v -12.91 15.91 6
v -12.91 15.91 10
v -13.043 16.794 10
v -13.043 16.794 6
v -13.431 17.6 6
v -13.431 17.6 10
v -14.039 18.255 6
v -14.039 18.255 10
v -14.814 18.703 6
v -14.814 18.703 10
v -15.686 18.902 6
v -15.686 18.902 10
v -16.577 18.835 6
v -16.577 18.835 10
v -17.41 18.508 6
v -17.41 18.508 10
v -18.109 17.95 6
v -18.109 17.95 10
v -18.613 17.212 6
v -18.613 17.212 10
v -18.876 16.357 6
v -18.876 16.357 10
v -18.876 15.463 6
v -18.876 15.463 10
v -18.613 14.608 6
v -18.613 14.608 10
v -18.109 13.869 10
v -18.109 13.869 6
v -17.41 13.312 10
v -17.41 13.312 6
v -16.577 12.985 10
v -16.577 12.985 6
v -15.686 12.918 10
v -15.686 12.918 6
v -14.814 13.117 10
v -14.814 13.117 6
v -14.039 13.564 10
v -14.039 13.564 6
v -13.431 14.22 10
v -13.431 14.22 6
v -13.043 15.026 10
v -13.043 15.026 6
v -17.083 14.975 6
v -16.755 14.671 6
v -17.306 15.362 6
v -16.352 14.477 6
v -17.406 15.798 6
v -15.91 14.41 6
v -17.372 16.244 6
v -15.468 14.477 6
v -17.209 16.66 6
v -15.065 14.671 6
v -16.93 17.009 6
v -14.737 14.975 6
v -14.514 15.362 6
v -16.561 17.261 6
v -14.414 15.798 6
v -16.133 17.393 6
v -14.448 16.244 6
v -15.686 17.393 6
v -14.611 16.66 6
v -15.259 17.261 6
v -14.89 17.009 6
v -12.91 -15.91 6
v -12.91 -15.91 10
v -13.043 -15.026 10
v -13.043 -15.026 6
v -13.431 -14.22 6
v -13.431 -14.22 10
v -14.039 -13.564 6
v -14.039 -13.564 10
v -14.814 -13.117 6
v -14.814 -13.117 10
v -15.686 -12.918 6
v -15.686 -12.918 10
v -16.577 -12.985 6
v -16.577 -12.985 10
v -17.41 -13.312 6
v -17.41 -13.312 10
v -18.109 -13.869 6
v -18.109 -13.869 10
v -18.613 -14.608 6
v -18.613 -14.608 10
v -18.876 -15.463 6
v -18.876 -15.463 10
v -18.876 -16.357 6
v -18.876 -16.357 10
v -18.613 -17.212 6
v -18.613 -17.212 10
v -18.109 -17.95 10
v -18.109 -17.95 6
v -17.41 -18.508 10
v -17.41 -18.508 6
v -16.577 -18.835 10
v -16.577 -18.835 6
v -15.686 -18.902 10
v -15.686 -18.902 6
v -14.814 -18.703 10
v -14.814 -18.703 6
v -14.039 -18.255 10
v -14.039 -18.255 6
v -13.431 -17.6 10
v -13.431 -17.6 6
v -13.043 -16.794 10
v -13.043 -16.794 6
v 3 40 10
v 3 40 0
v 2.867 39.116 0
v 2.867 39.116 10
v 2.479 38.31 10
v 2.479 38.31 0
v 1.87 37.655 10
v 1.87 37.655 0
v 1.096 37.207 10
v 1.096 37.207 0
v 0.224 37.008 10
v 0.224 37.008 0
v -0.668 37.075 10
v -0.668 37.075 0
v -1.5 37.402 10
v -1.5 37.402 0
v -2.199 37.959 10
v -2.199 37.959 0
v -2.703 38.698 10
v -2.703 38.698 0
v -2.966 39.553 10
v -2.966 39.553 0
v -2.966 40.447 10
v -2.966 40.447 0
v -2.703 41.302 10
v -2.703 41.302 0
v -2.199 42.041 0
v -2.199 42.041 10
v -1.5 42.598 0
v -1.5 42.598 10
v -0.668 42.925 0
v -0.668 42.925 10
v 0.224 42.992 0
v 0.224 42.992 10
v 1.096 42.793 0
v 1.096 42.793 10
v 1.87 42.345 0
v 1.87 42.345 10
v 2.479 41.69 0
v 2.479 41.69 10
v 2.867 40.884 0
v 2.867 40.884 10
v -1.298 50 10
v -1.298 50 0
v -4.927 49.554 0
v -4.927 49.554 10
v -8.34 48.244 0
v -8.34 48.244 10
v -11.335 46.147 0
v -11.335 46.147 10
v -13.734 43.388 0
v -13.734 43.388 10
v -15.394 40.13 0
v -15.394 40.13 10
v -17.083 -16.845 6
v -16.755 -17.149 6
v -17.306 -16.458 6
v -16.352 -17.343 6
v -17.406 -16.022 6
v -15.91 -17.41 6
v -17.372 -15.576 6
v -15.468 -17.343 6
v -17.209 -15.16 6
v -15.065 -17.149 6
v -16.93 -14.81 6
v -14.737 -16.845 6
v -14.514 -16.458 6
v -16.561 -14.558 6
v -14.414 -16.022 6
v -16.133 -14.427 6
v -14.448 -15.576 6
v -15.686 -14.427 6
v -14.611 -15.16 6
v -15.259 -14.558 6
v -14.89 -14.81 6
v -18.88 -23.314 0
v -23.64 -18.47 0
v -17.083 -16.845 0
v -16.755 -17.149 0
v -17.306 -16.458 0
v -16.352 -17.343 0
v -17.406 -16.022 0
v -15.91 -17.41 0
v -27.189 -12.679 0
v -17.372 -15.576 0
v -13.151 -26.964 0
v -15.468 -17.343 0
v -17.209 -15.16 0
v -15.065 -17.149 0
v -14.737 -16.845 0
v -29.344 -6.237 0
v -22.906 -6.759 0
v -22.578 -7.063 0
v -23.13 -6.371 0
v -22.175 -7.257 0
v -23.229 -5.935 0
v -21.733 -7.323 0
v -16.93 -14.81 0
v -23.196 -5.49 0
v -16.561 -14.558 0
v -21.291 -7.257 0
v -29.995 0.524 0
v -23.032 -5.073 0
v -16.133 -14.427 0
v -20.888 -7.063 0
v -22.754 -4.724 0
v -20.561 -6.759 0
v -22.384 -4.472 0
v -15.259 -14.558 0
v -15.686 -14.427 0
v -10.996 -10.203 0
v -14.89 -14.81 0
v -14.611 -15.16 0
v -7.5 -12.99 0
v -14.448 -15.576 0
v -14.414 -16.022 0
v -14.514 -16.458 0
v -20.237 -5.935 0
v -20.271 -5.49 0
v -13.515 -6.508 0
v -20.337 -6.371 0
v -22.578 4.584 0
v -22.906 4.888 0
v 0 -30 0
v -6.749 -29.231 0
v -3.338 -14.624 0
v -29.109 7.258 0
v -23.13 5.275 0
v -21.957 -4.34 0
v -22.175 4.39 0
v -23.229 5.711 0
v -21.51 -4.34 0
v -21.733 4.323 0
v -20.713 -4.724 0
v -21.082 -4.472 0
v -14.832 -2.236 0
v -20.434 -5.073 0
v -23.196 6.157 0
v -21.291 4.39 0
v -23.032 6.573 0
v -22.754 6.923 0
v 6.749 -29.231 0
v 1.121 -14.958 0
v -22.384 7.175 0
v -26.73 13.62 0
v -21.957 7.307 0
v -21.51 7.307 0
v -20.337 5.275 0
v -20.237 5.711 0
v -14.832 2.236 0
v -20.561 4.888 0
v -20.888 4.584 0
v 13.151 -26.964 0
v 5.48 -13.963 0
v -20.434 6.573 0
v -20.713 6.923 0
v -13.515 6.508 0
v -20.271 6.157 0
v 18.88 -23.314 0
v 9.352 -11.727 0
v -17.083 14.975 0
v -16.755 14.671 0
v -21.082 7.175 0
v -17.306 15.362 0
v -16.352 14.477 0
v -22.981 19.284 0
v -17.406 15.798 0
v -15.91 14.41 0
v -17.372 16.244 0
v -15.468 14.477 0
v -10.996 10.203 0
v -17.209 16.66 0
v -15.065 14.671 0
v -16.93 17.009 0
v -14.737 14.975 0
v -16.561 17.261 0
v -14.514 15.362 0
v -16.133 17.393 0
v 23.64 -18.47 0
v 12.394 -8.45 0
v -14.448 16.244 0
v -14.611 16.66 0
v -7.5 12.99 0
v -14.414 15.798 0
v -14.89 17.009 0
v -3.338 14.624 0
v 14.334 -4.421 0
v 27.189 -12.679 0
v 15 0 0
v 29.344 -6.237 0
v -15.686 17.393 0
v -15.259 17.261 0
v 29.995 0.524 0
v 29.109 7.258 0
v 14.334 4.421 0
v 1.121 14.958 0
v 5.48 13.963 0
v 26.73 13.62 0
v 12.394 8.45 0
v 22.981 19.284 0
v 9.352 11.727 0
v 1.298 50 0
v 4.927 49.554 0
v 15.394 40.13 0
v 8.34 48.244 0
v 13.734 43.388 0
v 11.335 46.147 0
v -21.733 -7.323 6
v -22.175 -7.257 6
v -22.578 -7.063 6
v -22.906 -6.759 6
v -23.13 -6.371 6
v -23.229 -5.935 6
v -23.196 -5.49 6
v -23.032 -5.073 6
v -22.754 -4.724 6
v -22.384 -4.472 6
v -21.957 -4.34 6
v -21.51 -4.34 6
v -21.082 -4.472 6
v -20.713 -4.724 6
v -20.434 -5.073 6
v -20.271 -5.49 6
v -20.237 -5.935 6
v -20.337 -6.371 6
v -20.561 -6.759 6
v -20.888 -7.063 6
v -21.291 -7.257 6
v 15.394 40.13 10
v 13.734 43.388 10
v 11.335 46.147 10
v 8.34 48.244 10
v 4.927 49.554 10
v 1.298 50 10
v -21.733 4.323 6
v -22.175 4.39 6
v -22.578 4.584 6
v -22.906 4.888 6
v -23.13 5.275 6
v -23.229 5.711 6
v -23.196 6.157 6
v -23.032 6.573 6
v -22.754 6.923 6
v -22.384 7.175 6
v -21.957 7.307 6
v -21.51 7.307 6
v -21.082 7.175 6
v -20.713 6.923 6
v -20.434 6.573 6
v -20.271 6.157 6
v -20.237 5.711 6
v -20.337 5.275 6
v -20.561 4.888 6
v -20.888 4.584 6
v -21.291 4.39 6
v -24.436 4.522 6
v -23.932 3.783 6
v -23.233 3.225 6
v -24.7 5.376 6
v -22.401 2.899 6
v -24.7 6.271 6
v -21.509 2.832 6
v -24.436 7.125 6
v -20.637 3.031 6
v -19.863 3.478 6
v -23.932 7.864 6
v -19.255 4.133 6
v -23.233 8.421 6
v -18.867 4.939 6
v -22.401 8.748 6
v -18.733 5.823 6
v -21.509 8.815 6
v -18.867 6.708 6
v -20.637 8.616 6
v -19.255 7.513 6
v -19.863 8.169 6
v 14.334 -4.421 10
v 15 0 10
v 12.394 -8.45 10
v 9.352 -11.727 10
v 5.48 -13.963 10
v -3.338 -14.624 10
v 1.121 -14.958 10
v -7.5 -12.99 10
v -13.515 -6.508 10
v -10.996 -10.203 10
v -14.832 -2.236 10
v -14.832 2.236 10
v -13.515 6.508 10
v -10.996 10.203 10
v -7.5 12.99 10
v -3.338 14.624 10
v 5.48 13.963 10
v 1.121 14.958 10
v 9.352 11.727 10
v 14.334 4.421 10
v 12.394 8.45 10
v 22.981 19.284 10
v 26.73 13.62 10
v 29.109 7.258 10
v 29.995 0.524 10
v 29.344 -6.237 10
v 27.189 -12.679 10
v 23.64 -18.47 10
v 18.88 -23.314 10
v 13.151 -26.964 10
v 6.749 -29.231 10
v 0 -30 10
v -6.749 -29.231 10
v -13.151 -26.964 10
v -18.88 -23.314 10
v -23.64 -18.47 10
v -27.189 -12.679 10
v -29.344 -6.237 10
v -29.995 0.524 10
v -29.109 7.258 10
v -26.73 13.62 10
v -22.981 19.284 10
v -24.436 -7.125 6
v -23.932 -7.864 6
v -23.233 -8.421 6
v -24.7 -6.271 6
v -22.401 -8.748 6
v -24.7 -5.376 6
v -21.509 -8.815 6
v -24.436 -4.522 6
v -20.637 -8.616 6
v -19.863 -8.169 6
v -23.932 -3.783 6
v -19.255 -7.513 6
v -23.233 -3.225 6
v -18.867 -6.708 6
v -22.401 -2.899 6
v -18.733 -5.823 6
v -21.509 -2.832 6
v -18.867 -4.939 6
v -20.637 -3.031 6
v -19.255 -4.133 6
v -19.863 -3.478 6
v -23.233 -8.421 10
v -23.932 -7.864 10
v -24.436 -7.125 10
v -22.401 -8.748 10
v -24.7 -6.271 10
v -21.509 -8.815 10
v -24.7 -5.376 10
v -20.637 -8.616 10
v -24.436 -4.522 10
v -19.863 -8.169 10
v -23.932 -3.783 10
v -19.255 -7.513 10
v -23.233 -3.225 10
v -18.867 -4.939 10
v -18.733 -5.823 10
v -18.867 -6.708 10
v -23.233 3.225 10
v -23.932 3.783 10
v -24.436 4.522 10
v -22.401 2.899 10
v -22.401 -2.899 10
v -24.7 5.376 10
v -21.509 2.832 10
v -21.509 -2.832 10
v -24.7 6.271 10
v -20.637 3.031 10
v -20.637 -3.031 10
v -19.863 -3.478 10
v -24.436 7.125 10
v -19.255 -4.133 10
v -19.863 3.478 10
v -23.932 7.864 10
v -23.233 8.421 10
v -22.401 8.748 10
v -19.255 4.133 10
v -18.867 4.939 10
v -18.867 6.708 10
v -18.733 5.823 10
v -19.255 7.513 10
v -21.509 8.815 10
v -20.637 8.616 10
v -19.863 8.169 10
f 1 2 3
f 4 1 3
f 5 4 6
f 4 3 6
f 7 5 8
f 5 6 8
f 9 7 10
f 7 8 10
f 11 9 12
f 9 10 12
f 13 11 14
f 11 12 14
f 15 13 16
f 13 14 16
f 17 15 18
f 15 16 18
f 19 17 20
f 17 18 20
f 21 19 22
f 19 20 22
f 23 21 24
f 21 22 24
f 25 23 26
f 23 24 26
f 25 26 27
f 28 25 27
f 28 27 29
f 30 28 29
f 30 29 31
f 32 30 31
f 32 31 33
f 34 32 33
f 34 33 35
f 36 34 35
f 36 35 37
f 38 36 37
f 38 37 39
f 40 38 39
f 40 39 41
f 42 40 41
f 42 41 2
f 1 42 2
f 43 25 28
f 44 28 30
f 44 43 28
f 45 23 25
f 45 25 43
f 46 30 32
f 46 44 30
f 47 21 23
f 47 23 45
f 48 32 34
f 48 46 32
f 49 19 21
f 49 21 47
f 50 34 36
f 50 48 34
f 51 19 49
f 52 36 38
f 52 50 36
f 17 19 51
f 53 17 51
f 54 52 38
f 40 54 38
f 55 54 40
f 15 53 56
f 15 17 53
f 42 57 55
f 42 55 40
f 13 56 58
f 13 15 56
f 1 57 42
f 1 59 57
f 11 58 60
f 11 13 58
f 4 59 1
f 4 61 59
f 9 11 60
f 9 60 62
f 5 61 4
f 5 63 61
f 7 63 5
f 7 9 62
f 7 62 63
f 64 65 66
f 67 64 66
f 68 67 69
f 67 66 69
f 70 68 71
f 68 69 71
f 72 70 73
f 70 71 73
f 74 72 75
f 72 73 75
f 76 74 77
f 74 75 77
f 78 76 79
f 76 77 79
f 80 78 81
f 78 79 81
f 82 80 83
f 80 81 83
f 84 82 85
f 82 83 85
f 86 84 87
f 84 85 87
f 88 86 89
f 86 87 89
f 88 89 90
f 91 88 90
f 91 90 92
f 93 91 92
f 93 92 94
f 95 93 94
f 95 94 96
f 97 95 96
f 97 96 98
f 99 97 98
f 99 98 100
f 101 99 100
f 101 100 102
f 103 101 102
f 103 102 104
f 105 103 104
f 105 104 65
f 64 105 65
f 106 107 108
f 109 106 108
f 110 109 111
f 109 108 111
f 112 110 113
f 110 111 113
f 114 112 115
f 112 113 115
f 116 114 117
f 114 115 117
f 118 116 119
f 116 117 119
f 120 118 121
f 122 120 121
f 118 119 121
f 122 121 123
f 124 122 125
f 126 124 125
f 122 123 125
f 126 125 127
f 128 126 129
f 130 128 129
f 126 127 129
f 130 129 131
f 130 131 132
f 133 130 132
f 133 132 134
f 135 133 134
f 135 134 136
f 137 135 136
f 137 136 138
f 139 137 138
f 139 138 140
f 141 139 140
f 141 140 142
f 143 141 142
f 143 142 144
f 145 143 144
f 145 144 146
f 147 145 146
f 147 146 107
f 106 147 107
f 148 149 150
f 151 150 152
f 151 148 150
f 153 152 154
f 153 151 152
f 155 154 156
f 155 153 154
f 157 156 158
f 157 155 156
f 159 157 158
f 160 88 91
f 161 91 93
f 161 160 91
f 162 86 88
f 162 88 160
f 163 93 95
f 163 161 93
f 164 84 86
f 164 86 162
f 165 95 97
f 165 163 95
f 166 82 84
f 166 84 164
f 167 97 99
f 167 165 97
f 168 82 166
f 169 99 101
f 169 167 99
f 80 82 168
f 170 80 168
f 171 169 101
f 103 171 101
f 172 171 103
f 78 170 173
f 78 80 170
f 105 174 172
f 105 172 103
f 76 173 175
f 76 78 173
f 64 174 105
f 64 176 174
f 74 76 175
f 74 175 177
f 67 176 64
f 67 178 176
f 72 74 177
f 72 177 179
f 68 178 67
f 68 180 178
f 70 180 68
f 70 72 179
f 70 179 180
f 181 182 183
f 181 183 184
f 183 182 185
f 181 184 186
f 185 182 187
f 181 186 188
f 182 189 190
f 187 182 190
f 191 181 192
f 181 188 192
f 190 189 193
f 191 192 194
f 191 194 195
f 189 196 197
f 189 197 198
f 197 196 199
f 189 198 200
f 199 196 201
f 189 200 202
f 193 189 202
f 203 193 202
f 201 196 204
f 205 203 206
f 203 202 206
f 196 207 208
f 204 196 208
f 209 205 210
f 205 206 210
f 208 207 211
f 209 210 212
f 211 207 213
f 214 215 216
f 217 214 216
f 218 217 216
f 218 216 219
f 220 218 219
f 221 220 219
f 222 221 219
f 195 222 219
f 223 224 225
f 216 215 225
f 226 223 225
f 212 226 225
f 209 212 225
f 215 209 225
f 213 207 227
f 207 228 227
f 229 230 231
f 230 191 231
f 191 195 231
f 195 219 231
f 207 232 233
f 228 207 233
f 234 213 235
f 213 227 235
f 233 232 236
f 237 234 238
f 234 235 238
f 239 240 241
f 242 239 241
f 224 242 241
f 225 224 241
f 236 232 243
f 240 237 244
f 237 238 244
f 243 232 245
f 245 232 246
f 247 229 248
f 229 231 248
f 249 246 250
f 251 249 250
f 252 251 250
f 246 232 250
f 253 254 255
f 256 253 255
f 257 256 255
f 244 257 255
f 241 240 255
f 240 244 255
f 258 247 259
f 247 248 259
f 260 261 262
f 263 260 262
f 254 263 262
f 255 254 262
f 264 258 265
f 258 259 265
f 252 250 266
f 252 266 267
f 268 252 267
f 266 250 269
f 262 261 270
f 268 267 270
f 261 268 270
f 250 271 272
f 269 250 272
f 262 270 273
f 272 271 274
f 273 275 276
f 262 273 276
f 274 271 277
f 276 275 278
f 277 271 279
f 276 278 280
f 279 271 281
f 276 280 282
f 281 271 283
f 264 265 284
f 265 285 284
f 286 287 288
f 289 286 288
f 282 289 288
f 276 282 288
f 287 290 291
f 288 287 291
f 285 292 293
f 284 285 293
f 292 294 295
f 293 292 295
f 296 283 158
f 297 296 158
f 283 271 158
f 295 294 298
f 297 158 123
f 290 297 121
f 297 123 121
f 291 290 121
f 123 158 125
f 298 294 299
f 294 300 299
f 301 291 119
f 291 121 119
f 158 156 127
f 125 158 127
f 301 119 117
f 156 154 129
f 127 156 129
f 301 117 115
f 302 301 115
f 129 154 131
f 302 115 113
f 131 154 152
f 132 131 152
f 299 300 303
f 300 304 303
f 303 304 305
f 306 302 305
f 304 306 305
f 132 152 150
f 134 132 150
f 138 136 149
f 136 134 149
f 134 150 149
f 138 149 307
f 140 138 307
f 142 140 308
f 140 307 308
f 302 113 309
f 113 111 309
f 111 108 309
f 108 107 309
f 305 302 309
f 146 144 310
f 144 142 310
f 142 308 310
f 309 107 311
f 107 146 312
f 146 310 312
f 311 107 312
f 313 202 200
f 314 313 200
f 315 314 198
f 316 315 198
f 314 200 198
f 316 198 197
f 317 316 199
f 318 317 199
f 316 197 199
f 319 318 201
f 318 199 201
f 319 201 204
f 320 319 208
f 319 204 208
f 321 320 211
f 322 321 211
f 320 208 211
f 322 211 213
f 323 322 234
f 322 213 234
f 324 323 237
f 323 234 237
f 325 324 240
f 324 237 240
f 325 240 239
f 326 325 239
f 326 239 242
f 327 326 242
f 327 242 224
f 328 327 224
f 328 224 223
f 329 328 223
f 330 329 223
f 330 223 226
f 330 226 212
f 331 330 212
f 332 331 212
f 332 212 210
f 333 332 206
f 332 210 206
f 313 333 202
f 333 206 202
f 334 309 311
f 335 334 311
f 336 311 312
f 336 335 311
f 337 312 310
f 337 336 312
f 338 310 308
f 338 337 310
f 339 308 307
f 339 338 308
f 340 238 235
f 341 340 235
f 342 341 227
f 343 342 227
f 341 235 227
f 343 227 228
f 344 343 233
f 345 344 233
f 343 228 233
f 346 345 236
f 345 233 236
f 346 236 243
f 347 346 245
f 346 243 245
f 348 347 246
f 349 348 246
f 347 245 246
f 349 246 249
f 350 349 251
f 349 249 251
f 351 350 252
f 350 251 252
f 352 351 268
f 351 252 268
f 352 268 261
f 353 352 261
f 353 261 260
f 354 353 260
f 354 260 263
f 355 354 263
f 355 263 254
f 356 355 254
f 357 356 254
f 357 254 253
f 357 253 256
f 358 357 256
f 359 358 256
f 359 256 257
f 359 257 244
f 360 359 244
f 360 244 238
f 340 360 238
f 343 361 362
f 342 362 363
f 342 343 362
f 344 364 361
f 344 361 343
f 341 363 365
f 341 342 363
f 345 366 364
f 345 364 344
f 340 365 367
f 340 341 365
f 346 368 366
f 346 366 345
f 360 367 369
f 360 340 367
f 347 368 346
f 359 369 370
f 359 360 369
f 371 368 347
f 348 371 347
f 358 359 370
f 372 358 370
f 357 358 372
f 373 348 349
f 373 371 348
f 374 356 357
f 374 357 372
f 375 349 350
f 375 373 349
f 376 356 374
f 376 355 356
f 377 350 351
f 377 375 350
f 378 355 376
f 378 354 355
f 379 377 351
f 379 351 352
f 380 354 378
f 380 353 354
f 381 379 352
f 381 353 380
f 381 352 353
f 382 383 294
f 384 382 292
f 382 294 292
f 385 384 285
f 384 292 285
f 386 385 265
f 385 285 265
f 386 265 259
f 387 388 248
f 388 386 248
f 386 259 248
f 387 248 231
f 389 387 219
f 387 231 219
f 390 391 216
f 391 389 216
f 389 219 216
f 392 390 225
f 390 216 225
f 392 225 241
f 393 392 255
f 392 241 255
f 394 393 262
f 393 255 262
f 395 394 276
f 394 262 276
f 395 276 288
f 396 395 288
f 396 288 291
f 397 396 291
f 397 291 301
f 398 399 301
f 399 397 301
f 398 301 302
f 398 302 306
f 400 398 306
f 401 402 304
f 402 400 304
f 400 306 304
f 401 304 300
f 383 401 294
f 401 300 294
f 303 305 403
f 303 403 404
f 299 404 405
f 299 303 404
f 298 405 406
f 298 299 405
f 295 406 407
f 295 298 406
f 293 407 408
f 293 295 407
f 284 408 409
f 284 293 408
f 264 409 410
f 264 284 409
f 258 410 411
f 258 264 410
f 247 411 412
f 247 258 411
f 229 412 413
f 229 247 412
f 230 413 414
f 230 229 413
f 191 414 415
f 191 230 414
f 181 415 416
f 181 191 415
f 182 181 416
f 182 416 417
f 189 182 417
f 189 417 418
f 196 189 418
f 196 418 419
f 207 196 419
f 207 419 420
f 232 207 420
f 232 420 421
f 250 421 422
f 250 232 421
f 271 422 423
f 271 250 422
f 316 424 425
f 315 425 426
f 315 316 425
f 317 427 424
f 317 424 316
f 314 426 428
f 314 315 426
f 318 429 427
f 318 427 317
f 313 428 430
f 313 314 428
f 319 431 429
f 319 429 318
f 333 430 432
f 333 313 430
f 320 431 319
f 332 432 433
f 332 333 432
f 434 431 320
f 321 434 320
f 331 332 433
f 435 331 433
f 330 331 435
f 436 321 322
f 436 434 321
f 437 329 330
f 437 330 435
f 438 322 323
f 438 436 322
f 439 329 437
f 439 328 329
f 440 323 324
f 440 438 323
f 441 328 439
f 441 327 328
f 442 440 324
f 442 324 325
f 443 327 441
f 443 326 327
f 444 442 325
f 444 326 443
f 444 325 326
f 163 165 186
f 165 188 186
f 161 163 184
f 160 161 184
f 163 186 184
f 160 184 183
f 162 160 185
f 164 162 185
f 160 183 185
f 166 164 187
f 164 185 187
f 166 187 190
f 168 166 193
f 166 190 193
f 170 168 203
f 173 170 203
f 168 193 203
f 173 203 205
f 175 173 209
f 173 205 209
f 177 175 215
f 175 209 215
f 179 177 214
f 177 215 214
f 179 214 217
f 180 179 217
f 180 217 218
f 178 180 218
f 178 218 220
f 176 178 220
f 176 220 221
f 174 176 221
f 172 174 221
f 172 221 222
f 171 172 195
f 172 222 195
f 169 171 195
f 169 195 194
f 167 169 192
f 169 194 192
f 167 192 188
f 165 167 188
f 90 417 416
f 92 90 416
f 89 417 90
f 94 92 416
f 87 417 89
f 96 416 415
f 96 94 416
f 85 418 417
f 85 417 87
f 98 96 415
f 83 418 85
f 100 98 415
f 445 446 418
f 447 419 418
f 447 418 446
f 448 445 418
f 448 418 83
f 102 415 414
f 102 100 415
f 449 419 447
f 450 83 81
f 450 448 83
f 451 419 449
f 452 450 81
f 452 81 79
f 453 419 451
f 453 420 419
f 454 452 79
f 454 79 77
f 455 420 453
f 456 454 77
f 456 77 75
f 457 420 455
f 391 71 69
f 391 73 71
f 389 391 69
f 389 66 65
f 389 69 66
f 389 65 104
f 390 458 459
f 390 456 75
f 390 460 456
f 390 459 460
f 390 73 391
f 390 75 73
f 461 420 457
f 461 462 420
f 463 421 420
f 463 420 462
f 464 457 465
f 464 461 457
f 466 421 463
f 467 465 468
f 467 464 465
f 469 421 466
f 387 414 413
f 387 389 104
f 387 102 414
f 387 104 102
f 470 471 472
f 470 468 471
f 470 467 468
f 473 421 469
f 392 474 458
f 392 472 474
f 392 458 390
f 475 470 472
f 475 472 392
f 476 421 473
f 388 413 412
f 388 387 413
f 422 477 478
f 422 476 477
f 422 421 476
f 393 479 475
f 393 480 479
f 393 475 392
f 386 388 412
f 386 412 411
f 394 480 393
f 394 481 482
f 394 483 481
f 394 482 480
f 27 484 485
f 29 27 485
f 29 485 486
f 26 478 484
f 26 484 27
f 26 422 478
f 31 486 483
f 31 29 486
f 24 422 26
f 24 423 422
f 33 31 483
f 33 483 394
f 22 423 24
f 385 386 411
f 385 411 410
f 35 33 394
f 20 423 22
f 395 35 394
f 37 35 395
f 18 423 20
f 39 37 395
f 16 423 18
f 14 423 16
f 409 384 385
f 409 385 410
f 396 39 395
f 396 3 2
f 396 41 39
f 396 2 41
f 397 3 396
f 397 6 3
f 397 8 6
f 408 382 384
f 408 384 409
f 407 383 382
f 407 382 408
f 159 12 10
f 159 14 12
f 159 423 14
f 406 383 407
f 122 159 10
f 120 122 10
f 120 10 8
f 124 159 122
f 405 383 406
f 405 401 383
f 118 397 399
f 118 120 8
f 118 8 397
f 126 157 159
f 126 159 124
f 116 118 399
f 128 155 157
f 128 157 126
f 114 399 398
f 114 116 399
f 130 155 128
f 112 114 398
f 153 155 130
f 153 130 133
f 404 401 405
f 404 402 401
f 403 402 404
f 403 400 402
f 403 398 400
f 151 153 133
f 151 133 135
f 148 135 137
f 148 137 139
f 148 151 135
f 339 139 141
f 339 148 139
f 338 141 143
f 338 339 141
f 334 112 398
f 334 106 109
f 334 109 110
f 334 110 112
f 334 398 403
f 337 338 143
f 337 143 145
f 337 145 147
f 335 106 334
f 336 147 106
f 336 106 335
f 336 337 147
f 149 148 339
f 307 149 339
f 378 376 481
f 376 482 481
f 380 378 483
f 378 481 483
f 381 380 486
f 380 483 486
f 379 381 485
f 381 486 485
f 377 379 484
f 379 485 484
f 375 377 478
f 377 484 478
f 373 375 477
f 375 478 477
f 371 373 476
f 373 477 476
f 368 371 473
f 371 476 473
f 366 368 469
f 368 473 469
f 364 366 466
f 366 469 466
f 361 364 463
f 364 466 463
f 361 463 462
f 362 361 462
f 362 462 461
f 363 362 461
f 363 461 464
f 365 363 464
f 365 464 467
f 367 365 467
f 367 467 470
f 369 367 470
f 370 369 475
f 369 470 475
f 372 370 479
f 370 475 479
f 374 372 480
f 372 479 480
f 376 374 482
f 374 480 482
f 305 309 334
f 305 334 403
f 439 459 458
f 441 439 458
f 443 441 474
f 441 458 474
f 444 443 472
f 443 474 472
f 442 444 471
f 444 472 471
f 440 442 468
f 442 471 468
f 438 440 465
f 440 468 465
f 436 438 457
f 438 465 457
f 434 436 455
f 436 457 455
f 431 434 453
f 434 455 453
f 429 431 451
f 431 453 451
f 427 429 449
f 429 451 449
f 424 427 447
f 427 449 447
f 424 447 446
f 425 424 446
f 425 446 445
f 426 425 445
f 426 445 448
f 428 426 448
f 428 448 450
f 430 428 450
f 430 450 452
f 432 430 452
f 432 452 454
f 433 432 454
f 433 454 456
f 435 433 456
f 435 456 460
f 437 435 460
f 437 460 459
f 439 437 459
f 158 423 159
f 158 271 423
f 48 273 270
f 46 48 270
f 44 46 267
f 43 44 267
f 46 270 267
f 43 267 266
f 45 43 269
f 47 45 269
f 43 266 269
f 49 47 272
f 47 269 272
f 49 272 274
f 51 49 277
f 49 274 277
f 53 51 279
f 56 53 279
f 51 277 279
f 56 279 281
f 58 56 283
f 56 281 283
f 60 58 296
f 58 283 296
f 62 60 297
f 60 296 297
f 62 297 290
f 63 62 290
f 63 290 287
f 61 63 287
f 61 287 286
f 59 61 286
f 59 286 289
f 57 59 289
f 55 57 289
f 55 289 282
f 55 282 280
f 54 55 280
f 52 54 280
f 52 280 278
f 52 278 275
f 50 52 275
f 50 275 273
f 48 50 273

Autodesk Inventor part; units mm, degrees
ref_plane "YZ Plane" through (0, 0, 0) normal (1, 0, 0) x (0, 1, 0)
ref_plane "XZ Plane" through (0, 0, 0) normal (0, 1, 0) x (-1, 0, 0)
ref_plane "XY Plane" through (0, 0, 0) normal (0, 0, 1) x (1, 0, 0)
sketch "スケッチ12" plane through (0, 0, 0) normal (0, 0, 1) x (1, 0, 0)
  circle A0 centre (0, 0) radius 30
  circle A1 centre (0, 0) radius 15
  line L0 (-30, 0) -> (30, 0)
  line L1 (-30, 0) -> (-11.8015, 50)
  line L2 (-11.8015, 50) -> (11.8015, 50)
  line L3 (11.8015, 50) -> (30, 0)
  circle A2 centre (0, 40) radius 3
  line L4 (11.8015, 50) -> (-30, 0)
  line L5 (-11.8015, 50) -> (30, 0)
  point P0 (22.9813, 19.2836)
  point P1 (-22.9813, 19.2836)
  point P2 (0, 51.9615)
  point P3 (5.316, 29.5252)
  point P4 (-5.316, 29.5252)
  point P5 (-2.2669, 48.0351)
  point P6 (2.2669, 48.0351)
  point P7 (0, 35.8839)
  point P8 (-15, 0)
  point P9 (15, 0)
  dimension "d5" = 60
  dimension "d6" = 30
  dimension "d10" = 70
  dimension "d11" = 70
  dimension "d12" = 50
  dimension "d13" = 40
  dimension "d14" = 6
  dimension "d38" = 30
extrude "押し出し2" add sketch "スケッチ12" along normal blind 10 contours L0 A1 A0 | L4 A0 L5 L0 A1 | A0 L1 | L1 A0 L4 | L3 A0 | L5 A0 L3 | L1 L5 A2 L4 A0 | L4 L5 A0 | A0 L5 L4 A2 L3 | L2 L4 A2 L5 | L5 A2 L4 picked at (0.1887, 36.6459)
sketch "スケッチ13" plane through (0, 0, 10) normal (0, 0, 1) x (1, 0, 0)
  circle A0 centre (0, 0) radius 20
  circle A1 centre (0, 0) radius 25
  circle A2 centre (0, 0) radius 22.5
  line L0 (0, 0) -> (-18.638, 32.282)
  line L1 (-18.638, 32.282) -> (0, 0)
  line L2 (0, 0) -> (-17.2844, -29.9374)
  line L3 (0, 0) -> (-56.8729, 0)
  line L4 (0, 0) -> (-31.7394, -18.3248)
  line L5 (0, 0) -> (-33.3883, 19.2767)
  line L6 (0, 0) -> (0, -31.9785)
  line L7 (0, 0) -> (-25.7143, 25.7143)
  line L8 (0, 0) -> (-33.0547, 8.857)
  line L9 (0, 0) -> (-32.621, -8.7408)
  line L10 (0, 0) -> (-23.652, -23.652)
  point P0 (-19.4856, 11.25)
  point P1 (-22.5, 0)
  point P2 (-19.4856, -11.25)
  point P3 (-11.25, -19.4856)
  point P4 (0, -22.5)
  point P5 (-16.5273, 4.4285)
  point P6 (-15.9099, 15.9099)
  point P7 (-21.7333, 5.8234)
  point P8 (-21.7333, -5.8234)
  point P9 (-15.9099, -15.9099)
  dimension "d19" = 45
  dimension "d17" = 40
  dimension "d18" = 50
  dimension "d20" = 60
  dimension "d21" = 60
  dimension "d22" = 30
  dimension "d23" = 30
  dimension "d31" = 150
  dimension "d32" = 15
  dimension "d34" = 15
  dimension "d35" = 15
  dimension "d36" = 15
hole "穴1" at (-15.9099, 15.9099, 10) at (-21.7333, 5.8234, 10) at (-21.7333, -5.8234, 10) at (-15.9099, -15.9099, 10) direction (0, 0, -1) diameter 3 end through all
sketch "スケッチ14" plane through (0, 0, 10) normal (0, 0, 1) x (1, 0, 0)
  circle A0 centre (-15.9099, 15.9099) radius 1.5 projected
  circle A1 centre (-15.9099, 15.9099) radius 3
  circle A2 centre (-21.7333, 5.8234) radius 1.5 projected
  circle A3 centre (-21.7333, 5.8234) radius 3
  circle A4 centre (-21.7333, -5.8234) radius 1.5 projected
  circle A5 centre (-21.7333, -5.8234) radius 3
  circle A6 centre (-15.9099, -15.9099) radius 1.5 projected
  circle A7 centre (-15.9099, -15.9099) radius 3
  point P0 (0, 0)
  dimension "d40" = 6
  dimension "d41" = 6
  dimension "d42" = 6
  dimension "d43" = 6
extrude "押し出し3" cut sketch "スケッチ14" against normal blind 4 contours A0 | A1 | A2 | A3 | A4 | A5 | A6 | A7
fillet "フィレット2" radius 15 2 edges at (-11.8015, 50, 5) (11.8015, 50, 5)
equation "\"d10\" = d11"
equation "\"d35\" = d34"
equation "\"d36\" = d35"
equation "\"d41\" = d40"
equation "\"d42\" = d41"
equation "\"d43\" = d42"
properties part number "legparts_04(six)"
